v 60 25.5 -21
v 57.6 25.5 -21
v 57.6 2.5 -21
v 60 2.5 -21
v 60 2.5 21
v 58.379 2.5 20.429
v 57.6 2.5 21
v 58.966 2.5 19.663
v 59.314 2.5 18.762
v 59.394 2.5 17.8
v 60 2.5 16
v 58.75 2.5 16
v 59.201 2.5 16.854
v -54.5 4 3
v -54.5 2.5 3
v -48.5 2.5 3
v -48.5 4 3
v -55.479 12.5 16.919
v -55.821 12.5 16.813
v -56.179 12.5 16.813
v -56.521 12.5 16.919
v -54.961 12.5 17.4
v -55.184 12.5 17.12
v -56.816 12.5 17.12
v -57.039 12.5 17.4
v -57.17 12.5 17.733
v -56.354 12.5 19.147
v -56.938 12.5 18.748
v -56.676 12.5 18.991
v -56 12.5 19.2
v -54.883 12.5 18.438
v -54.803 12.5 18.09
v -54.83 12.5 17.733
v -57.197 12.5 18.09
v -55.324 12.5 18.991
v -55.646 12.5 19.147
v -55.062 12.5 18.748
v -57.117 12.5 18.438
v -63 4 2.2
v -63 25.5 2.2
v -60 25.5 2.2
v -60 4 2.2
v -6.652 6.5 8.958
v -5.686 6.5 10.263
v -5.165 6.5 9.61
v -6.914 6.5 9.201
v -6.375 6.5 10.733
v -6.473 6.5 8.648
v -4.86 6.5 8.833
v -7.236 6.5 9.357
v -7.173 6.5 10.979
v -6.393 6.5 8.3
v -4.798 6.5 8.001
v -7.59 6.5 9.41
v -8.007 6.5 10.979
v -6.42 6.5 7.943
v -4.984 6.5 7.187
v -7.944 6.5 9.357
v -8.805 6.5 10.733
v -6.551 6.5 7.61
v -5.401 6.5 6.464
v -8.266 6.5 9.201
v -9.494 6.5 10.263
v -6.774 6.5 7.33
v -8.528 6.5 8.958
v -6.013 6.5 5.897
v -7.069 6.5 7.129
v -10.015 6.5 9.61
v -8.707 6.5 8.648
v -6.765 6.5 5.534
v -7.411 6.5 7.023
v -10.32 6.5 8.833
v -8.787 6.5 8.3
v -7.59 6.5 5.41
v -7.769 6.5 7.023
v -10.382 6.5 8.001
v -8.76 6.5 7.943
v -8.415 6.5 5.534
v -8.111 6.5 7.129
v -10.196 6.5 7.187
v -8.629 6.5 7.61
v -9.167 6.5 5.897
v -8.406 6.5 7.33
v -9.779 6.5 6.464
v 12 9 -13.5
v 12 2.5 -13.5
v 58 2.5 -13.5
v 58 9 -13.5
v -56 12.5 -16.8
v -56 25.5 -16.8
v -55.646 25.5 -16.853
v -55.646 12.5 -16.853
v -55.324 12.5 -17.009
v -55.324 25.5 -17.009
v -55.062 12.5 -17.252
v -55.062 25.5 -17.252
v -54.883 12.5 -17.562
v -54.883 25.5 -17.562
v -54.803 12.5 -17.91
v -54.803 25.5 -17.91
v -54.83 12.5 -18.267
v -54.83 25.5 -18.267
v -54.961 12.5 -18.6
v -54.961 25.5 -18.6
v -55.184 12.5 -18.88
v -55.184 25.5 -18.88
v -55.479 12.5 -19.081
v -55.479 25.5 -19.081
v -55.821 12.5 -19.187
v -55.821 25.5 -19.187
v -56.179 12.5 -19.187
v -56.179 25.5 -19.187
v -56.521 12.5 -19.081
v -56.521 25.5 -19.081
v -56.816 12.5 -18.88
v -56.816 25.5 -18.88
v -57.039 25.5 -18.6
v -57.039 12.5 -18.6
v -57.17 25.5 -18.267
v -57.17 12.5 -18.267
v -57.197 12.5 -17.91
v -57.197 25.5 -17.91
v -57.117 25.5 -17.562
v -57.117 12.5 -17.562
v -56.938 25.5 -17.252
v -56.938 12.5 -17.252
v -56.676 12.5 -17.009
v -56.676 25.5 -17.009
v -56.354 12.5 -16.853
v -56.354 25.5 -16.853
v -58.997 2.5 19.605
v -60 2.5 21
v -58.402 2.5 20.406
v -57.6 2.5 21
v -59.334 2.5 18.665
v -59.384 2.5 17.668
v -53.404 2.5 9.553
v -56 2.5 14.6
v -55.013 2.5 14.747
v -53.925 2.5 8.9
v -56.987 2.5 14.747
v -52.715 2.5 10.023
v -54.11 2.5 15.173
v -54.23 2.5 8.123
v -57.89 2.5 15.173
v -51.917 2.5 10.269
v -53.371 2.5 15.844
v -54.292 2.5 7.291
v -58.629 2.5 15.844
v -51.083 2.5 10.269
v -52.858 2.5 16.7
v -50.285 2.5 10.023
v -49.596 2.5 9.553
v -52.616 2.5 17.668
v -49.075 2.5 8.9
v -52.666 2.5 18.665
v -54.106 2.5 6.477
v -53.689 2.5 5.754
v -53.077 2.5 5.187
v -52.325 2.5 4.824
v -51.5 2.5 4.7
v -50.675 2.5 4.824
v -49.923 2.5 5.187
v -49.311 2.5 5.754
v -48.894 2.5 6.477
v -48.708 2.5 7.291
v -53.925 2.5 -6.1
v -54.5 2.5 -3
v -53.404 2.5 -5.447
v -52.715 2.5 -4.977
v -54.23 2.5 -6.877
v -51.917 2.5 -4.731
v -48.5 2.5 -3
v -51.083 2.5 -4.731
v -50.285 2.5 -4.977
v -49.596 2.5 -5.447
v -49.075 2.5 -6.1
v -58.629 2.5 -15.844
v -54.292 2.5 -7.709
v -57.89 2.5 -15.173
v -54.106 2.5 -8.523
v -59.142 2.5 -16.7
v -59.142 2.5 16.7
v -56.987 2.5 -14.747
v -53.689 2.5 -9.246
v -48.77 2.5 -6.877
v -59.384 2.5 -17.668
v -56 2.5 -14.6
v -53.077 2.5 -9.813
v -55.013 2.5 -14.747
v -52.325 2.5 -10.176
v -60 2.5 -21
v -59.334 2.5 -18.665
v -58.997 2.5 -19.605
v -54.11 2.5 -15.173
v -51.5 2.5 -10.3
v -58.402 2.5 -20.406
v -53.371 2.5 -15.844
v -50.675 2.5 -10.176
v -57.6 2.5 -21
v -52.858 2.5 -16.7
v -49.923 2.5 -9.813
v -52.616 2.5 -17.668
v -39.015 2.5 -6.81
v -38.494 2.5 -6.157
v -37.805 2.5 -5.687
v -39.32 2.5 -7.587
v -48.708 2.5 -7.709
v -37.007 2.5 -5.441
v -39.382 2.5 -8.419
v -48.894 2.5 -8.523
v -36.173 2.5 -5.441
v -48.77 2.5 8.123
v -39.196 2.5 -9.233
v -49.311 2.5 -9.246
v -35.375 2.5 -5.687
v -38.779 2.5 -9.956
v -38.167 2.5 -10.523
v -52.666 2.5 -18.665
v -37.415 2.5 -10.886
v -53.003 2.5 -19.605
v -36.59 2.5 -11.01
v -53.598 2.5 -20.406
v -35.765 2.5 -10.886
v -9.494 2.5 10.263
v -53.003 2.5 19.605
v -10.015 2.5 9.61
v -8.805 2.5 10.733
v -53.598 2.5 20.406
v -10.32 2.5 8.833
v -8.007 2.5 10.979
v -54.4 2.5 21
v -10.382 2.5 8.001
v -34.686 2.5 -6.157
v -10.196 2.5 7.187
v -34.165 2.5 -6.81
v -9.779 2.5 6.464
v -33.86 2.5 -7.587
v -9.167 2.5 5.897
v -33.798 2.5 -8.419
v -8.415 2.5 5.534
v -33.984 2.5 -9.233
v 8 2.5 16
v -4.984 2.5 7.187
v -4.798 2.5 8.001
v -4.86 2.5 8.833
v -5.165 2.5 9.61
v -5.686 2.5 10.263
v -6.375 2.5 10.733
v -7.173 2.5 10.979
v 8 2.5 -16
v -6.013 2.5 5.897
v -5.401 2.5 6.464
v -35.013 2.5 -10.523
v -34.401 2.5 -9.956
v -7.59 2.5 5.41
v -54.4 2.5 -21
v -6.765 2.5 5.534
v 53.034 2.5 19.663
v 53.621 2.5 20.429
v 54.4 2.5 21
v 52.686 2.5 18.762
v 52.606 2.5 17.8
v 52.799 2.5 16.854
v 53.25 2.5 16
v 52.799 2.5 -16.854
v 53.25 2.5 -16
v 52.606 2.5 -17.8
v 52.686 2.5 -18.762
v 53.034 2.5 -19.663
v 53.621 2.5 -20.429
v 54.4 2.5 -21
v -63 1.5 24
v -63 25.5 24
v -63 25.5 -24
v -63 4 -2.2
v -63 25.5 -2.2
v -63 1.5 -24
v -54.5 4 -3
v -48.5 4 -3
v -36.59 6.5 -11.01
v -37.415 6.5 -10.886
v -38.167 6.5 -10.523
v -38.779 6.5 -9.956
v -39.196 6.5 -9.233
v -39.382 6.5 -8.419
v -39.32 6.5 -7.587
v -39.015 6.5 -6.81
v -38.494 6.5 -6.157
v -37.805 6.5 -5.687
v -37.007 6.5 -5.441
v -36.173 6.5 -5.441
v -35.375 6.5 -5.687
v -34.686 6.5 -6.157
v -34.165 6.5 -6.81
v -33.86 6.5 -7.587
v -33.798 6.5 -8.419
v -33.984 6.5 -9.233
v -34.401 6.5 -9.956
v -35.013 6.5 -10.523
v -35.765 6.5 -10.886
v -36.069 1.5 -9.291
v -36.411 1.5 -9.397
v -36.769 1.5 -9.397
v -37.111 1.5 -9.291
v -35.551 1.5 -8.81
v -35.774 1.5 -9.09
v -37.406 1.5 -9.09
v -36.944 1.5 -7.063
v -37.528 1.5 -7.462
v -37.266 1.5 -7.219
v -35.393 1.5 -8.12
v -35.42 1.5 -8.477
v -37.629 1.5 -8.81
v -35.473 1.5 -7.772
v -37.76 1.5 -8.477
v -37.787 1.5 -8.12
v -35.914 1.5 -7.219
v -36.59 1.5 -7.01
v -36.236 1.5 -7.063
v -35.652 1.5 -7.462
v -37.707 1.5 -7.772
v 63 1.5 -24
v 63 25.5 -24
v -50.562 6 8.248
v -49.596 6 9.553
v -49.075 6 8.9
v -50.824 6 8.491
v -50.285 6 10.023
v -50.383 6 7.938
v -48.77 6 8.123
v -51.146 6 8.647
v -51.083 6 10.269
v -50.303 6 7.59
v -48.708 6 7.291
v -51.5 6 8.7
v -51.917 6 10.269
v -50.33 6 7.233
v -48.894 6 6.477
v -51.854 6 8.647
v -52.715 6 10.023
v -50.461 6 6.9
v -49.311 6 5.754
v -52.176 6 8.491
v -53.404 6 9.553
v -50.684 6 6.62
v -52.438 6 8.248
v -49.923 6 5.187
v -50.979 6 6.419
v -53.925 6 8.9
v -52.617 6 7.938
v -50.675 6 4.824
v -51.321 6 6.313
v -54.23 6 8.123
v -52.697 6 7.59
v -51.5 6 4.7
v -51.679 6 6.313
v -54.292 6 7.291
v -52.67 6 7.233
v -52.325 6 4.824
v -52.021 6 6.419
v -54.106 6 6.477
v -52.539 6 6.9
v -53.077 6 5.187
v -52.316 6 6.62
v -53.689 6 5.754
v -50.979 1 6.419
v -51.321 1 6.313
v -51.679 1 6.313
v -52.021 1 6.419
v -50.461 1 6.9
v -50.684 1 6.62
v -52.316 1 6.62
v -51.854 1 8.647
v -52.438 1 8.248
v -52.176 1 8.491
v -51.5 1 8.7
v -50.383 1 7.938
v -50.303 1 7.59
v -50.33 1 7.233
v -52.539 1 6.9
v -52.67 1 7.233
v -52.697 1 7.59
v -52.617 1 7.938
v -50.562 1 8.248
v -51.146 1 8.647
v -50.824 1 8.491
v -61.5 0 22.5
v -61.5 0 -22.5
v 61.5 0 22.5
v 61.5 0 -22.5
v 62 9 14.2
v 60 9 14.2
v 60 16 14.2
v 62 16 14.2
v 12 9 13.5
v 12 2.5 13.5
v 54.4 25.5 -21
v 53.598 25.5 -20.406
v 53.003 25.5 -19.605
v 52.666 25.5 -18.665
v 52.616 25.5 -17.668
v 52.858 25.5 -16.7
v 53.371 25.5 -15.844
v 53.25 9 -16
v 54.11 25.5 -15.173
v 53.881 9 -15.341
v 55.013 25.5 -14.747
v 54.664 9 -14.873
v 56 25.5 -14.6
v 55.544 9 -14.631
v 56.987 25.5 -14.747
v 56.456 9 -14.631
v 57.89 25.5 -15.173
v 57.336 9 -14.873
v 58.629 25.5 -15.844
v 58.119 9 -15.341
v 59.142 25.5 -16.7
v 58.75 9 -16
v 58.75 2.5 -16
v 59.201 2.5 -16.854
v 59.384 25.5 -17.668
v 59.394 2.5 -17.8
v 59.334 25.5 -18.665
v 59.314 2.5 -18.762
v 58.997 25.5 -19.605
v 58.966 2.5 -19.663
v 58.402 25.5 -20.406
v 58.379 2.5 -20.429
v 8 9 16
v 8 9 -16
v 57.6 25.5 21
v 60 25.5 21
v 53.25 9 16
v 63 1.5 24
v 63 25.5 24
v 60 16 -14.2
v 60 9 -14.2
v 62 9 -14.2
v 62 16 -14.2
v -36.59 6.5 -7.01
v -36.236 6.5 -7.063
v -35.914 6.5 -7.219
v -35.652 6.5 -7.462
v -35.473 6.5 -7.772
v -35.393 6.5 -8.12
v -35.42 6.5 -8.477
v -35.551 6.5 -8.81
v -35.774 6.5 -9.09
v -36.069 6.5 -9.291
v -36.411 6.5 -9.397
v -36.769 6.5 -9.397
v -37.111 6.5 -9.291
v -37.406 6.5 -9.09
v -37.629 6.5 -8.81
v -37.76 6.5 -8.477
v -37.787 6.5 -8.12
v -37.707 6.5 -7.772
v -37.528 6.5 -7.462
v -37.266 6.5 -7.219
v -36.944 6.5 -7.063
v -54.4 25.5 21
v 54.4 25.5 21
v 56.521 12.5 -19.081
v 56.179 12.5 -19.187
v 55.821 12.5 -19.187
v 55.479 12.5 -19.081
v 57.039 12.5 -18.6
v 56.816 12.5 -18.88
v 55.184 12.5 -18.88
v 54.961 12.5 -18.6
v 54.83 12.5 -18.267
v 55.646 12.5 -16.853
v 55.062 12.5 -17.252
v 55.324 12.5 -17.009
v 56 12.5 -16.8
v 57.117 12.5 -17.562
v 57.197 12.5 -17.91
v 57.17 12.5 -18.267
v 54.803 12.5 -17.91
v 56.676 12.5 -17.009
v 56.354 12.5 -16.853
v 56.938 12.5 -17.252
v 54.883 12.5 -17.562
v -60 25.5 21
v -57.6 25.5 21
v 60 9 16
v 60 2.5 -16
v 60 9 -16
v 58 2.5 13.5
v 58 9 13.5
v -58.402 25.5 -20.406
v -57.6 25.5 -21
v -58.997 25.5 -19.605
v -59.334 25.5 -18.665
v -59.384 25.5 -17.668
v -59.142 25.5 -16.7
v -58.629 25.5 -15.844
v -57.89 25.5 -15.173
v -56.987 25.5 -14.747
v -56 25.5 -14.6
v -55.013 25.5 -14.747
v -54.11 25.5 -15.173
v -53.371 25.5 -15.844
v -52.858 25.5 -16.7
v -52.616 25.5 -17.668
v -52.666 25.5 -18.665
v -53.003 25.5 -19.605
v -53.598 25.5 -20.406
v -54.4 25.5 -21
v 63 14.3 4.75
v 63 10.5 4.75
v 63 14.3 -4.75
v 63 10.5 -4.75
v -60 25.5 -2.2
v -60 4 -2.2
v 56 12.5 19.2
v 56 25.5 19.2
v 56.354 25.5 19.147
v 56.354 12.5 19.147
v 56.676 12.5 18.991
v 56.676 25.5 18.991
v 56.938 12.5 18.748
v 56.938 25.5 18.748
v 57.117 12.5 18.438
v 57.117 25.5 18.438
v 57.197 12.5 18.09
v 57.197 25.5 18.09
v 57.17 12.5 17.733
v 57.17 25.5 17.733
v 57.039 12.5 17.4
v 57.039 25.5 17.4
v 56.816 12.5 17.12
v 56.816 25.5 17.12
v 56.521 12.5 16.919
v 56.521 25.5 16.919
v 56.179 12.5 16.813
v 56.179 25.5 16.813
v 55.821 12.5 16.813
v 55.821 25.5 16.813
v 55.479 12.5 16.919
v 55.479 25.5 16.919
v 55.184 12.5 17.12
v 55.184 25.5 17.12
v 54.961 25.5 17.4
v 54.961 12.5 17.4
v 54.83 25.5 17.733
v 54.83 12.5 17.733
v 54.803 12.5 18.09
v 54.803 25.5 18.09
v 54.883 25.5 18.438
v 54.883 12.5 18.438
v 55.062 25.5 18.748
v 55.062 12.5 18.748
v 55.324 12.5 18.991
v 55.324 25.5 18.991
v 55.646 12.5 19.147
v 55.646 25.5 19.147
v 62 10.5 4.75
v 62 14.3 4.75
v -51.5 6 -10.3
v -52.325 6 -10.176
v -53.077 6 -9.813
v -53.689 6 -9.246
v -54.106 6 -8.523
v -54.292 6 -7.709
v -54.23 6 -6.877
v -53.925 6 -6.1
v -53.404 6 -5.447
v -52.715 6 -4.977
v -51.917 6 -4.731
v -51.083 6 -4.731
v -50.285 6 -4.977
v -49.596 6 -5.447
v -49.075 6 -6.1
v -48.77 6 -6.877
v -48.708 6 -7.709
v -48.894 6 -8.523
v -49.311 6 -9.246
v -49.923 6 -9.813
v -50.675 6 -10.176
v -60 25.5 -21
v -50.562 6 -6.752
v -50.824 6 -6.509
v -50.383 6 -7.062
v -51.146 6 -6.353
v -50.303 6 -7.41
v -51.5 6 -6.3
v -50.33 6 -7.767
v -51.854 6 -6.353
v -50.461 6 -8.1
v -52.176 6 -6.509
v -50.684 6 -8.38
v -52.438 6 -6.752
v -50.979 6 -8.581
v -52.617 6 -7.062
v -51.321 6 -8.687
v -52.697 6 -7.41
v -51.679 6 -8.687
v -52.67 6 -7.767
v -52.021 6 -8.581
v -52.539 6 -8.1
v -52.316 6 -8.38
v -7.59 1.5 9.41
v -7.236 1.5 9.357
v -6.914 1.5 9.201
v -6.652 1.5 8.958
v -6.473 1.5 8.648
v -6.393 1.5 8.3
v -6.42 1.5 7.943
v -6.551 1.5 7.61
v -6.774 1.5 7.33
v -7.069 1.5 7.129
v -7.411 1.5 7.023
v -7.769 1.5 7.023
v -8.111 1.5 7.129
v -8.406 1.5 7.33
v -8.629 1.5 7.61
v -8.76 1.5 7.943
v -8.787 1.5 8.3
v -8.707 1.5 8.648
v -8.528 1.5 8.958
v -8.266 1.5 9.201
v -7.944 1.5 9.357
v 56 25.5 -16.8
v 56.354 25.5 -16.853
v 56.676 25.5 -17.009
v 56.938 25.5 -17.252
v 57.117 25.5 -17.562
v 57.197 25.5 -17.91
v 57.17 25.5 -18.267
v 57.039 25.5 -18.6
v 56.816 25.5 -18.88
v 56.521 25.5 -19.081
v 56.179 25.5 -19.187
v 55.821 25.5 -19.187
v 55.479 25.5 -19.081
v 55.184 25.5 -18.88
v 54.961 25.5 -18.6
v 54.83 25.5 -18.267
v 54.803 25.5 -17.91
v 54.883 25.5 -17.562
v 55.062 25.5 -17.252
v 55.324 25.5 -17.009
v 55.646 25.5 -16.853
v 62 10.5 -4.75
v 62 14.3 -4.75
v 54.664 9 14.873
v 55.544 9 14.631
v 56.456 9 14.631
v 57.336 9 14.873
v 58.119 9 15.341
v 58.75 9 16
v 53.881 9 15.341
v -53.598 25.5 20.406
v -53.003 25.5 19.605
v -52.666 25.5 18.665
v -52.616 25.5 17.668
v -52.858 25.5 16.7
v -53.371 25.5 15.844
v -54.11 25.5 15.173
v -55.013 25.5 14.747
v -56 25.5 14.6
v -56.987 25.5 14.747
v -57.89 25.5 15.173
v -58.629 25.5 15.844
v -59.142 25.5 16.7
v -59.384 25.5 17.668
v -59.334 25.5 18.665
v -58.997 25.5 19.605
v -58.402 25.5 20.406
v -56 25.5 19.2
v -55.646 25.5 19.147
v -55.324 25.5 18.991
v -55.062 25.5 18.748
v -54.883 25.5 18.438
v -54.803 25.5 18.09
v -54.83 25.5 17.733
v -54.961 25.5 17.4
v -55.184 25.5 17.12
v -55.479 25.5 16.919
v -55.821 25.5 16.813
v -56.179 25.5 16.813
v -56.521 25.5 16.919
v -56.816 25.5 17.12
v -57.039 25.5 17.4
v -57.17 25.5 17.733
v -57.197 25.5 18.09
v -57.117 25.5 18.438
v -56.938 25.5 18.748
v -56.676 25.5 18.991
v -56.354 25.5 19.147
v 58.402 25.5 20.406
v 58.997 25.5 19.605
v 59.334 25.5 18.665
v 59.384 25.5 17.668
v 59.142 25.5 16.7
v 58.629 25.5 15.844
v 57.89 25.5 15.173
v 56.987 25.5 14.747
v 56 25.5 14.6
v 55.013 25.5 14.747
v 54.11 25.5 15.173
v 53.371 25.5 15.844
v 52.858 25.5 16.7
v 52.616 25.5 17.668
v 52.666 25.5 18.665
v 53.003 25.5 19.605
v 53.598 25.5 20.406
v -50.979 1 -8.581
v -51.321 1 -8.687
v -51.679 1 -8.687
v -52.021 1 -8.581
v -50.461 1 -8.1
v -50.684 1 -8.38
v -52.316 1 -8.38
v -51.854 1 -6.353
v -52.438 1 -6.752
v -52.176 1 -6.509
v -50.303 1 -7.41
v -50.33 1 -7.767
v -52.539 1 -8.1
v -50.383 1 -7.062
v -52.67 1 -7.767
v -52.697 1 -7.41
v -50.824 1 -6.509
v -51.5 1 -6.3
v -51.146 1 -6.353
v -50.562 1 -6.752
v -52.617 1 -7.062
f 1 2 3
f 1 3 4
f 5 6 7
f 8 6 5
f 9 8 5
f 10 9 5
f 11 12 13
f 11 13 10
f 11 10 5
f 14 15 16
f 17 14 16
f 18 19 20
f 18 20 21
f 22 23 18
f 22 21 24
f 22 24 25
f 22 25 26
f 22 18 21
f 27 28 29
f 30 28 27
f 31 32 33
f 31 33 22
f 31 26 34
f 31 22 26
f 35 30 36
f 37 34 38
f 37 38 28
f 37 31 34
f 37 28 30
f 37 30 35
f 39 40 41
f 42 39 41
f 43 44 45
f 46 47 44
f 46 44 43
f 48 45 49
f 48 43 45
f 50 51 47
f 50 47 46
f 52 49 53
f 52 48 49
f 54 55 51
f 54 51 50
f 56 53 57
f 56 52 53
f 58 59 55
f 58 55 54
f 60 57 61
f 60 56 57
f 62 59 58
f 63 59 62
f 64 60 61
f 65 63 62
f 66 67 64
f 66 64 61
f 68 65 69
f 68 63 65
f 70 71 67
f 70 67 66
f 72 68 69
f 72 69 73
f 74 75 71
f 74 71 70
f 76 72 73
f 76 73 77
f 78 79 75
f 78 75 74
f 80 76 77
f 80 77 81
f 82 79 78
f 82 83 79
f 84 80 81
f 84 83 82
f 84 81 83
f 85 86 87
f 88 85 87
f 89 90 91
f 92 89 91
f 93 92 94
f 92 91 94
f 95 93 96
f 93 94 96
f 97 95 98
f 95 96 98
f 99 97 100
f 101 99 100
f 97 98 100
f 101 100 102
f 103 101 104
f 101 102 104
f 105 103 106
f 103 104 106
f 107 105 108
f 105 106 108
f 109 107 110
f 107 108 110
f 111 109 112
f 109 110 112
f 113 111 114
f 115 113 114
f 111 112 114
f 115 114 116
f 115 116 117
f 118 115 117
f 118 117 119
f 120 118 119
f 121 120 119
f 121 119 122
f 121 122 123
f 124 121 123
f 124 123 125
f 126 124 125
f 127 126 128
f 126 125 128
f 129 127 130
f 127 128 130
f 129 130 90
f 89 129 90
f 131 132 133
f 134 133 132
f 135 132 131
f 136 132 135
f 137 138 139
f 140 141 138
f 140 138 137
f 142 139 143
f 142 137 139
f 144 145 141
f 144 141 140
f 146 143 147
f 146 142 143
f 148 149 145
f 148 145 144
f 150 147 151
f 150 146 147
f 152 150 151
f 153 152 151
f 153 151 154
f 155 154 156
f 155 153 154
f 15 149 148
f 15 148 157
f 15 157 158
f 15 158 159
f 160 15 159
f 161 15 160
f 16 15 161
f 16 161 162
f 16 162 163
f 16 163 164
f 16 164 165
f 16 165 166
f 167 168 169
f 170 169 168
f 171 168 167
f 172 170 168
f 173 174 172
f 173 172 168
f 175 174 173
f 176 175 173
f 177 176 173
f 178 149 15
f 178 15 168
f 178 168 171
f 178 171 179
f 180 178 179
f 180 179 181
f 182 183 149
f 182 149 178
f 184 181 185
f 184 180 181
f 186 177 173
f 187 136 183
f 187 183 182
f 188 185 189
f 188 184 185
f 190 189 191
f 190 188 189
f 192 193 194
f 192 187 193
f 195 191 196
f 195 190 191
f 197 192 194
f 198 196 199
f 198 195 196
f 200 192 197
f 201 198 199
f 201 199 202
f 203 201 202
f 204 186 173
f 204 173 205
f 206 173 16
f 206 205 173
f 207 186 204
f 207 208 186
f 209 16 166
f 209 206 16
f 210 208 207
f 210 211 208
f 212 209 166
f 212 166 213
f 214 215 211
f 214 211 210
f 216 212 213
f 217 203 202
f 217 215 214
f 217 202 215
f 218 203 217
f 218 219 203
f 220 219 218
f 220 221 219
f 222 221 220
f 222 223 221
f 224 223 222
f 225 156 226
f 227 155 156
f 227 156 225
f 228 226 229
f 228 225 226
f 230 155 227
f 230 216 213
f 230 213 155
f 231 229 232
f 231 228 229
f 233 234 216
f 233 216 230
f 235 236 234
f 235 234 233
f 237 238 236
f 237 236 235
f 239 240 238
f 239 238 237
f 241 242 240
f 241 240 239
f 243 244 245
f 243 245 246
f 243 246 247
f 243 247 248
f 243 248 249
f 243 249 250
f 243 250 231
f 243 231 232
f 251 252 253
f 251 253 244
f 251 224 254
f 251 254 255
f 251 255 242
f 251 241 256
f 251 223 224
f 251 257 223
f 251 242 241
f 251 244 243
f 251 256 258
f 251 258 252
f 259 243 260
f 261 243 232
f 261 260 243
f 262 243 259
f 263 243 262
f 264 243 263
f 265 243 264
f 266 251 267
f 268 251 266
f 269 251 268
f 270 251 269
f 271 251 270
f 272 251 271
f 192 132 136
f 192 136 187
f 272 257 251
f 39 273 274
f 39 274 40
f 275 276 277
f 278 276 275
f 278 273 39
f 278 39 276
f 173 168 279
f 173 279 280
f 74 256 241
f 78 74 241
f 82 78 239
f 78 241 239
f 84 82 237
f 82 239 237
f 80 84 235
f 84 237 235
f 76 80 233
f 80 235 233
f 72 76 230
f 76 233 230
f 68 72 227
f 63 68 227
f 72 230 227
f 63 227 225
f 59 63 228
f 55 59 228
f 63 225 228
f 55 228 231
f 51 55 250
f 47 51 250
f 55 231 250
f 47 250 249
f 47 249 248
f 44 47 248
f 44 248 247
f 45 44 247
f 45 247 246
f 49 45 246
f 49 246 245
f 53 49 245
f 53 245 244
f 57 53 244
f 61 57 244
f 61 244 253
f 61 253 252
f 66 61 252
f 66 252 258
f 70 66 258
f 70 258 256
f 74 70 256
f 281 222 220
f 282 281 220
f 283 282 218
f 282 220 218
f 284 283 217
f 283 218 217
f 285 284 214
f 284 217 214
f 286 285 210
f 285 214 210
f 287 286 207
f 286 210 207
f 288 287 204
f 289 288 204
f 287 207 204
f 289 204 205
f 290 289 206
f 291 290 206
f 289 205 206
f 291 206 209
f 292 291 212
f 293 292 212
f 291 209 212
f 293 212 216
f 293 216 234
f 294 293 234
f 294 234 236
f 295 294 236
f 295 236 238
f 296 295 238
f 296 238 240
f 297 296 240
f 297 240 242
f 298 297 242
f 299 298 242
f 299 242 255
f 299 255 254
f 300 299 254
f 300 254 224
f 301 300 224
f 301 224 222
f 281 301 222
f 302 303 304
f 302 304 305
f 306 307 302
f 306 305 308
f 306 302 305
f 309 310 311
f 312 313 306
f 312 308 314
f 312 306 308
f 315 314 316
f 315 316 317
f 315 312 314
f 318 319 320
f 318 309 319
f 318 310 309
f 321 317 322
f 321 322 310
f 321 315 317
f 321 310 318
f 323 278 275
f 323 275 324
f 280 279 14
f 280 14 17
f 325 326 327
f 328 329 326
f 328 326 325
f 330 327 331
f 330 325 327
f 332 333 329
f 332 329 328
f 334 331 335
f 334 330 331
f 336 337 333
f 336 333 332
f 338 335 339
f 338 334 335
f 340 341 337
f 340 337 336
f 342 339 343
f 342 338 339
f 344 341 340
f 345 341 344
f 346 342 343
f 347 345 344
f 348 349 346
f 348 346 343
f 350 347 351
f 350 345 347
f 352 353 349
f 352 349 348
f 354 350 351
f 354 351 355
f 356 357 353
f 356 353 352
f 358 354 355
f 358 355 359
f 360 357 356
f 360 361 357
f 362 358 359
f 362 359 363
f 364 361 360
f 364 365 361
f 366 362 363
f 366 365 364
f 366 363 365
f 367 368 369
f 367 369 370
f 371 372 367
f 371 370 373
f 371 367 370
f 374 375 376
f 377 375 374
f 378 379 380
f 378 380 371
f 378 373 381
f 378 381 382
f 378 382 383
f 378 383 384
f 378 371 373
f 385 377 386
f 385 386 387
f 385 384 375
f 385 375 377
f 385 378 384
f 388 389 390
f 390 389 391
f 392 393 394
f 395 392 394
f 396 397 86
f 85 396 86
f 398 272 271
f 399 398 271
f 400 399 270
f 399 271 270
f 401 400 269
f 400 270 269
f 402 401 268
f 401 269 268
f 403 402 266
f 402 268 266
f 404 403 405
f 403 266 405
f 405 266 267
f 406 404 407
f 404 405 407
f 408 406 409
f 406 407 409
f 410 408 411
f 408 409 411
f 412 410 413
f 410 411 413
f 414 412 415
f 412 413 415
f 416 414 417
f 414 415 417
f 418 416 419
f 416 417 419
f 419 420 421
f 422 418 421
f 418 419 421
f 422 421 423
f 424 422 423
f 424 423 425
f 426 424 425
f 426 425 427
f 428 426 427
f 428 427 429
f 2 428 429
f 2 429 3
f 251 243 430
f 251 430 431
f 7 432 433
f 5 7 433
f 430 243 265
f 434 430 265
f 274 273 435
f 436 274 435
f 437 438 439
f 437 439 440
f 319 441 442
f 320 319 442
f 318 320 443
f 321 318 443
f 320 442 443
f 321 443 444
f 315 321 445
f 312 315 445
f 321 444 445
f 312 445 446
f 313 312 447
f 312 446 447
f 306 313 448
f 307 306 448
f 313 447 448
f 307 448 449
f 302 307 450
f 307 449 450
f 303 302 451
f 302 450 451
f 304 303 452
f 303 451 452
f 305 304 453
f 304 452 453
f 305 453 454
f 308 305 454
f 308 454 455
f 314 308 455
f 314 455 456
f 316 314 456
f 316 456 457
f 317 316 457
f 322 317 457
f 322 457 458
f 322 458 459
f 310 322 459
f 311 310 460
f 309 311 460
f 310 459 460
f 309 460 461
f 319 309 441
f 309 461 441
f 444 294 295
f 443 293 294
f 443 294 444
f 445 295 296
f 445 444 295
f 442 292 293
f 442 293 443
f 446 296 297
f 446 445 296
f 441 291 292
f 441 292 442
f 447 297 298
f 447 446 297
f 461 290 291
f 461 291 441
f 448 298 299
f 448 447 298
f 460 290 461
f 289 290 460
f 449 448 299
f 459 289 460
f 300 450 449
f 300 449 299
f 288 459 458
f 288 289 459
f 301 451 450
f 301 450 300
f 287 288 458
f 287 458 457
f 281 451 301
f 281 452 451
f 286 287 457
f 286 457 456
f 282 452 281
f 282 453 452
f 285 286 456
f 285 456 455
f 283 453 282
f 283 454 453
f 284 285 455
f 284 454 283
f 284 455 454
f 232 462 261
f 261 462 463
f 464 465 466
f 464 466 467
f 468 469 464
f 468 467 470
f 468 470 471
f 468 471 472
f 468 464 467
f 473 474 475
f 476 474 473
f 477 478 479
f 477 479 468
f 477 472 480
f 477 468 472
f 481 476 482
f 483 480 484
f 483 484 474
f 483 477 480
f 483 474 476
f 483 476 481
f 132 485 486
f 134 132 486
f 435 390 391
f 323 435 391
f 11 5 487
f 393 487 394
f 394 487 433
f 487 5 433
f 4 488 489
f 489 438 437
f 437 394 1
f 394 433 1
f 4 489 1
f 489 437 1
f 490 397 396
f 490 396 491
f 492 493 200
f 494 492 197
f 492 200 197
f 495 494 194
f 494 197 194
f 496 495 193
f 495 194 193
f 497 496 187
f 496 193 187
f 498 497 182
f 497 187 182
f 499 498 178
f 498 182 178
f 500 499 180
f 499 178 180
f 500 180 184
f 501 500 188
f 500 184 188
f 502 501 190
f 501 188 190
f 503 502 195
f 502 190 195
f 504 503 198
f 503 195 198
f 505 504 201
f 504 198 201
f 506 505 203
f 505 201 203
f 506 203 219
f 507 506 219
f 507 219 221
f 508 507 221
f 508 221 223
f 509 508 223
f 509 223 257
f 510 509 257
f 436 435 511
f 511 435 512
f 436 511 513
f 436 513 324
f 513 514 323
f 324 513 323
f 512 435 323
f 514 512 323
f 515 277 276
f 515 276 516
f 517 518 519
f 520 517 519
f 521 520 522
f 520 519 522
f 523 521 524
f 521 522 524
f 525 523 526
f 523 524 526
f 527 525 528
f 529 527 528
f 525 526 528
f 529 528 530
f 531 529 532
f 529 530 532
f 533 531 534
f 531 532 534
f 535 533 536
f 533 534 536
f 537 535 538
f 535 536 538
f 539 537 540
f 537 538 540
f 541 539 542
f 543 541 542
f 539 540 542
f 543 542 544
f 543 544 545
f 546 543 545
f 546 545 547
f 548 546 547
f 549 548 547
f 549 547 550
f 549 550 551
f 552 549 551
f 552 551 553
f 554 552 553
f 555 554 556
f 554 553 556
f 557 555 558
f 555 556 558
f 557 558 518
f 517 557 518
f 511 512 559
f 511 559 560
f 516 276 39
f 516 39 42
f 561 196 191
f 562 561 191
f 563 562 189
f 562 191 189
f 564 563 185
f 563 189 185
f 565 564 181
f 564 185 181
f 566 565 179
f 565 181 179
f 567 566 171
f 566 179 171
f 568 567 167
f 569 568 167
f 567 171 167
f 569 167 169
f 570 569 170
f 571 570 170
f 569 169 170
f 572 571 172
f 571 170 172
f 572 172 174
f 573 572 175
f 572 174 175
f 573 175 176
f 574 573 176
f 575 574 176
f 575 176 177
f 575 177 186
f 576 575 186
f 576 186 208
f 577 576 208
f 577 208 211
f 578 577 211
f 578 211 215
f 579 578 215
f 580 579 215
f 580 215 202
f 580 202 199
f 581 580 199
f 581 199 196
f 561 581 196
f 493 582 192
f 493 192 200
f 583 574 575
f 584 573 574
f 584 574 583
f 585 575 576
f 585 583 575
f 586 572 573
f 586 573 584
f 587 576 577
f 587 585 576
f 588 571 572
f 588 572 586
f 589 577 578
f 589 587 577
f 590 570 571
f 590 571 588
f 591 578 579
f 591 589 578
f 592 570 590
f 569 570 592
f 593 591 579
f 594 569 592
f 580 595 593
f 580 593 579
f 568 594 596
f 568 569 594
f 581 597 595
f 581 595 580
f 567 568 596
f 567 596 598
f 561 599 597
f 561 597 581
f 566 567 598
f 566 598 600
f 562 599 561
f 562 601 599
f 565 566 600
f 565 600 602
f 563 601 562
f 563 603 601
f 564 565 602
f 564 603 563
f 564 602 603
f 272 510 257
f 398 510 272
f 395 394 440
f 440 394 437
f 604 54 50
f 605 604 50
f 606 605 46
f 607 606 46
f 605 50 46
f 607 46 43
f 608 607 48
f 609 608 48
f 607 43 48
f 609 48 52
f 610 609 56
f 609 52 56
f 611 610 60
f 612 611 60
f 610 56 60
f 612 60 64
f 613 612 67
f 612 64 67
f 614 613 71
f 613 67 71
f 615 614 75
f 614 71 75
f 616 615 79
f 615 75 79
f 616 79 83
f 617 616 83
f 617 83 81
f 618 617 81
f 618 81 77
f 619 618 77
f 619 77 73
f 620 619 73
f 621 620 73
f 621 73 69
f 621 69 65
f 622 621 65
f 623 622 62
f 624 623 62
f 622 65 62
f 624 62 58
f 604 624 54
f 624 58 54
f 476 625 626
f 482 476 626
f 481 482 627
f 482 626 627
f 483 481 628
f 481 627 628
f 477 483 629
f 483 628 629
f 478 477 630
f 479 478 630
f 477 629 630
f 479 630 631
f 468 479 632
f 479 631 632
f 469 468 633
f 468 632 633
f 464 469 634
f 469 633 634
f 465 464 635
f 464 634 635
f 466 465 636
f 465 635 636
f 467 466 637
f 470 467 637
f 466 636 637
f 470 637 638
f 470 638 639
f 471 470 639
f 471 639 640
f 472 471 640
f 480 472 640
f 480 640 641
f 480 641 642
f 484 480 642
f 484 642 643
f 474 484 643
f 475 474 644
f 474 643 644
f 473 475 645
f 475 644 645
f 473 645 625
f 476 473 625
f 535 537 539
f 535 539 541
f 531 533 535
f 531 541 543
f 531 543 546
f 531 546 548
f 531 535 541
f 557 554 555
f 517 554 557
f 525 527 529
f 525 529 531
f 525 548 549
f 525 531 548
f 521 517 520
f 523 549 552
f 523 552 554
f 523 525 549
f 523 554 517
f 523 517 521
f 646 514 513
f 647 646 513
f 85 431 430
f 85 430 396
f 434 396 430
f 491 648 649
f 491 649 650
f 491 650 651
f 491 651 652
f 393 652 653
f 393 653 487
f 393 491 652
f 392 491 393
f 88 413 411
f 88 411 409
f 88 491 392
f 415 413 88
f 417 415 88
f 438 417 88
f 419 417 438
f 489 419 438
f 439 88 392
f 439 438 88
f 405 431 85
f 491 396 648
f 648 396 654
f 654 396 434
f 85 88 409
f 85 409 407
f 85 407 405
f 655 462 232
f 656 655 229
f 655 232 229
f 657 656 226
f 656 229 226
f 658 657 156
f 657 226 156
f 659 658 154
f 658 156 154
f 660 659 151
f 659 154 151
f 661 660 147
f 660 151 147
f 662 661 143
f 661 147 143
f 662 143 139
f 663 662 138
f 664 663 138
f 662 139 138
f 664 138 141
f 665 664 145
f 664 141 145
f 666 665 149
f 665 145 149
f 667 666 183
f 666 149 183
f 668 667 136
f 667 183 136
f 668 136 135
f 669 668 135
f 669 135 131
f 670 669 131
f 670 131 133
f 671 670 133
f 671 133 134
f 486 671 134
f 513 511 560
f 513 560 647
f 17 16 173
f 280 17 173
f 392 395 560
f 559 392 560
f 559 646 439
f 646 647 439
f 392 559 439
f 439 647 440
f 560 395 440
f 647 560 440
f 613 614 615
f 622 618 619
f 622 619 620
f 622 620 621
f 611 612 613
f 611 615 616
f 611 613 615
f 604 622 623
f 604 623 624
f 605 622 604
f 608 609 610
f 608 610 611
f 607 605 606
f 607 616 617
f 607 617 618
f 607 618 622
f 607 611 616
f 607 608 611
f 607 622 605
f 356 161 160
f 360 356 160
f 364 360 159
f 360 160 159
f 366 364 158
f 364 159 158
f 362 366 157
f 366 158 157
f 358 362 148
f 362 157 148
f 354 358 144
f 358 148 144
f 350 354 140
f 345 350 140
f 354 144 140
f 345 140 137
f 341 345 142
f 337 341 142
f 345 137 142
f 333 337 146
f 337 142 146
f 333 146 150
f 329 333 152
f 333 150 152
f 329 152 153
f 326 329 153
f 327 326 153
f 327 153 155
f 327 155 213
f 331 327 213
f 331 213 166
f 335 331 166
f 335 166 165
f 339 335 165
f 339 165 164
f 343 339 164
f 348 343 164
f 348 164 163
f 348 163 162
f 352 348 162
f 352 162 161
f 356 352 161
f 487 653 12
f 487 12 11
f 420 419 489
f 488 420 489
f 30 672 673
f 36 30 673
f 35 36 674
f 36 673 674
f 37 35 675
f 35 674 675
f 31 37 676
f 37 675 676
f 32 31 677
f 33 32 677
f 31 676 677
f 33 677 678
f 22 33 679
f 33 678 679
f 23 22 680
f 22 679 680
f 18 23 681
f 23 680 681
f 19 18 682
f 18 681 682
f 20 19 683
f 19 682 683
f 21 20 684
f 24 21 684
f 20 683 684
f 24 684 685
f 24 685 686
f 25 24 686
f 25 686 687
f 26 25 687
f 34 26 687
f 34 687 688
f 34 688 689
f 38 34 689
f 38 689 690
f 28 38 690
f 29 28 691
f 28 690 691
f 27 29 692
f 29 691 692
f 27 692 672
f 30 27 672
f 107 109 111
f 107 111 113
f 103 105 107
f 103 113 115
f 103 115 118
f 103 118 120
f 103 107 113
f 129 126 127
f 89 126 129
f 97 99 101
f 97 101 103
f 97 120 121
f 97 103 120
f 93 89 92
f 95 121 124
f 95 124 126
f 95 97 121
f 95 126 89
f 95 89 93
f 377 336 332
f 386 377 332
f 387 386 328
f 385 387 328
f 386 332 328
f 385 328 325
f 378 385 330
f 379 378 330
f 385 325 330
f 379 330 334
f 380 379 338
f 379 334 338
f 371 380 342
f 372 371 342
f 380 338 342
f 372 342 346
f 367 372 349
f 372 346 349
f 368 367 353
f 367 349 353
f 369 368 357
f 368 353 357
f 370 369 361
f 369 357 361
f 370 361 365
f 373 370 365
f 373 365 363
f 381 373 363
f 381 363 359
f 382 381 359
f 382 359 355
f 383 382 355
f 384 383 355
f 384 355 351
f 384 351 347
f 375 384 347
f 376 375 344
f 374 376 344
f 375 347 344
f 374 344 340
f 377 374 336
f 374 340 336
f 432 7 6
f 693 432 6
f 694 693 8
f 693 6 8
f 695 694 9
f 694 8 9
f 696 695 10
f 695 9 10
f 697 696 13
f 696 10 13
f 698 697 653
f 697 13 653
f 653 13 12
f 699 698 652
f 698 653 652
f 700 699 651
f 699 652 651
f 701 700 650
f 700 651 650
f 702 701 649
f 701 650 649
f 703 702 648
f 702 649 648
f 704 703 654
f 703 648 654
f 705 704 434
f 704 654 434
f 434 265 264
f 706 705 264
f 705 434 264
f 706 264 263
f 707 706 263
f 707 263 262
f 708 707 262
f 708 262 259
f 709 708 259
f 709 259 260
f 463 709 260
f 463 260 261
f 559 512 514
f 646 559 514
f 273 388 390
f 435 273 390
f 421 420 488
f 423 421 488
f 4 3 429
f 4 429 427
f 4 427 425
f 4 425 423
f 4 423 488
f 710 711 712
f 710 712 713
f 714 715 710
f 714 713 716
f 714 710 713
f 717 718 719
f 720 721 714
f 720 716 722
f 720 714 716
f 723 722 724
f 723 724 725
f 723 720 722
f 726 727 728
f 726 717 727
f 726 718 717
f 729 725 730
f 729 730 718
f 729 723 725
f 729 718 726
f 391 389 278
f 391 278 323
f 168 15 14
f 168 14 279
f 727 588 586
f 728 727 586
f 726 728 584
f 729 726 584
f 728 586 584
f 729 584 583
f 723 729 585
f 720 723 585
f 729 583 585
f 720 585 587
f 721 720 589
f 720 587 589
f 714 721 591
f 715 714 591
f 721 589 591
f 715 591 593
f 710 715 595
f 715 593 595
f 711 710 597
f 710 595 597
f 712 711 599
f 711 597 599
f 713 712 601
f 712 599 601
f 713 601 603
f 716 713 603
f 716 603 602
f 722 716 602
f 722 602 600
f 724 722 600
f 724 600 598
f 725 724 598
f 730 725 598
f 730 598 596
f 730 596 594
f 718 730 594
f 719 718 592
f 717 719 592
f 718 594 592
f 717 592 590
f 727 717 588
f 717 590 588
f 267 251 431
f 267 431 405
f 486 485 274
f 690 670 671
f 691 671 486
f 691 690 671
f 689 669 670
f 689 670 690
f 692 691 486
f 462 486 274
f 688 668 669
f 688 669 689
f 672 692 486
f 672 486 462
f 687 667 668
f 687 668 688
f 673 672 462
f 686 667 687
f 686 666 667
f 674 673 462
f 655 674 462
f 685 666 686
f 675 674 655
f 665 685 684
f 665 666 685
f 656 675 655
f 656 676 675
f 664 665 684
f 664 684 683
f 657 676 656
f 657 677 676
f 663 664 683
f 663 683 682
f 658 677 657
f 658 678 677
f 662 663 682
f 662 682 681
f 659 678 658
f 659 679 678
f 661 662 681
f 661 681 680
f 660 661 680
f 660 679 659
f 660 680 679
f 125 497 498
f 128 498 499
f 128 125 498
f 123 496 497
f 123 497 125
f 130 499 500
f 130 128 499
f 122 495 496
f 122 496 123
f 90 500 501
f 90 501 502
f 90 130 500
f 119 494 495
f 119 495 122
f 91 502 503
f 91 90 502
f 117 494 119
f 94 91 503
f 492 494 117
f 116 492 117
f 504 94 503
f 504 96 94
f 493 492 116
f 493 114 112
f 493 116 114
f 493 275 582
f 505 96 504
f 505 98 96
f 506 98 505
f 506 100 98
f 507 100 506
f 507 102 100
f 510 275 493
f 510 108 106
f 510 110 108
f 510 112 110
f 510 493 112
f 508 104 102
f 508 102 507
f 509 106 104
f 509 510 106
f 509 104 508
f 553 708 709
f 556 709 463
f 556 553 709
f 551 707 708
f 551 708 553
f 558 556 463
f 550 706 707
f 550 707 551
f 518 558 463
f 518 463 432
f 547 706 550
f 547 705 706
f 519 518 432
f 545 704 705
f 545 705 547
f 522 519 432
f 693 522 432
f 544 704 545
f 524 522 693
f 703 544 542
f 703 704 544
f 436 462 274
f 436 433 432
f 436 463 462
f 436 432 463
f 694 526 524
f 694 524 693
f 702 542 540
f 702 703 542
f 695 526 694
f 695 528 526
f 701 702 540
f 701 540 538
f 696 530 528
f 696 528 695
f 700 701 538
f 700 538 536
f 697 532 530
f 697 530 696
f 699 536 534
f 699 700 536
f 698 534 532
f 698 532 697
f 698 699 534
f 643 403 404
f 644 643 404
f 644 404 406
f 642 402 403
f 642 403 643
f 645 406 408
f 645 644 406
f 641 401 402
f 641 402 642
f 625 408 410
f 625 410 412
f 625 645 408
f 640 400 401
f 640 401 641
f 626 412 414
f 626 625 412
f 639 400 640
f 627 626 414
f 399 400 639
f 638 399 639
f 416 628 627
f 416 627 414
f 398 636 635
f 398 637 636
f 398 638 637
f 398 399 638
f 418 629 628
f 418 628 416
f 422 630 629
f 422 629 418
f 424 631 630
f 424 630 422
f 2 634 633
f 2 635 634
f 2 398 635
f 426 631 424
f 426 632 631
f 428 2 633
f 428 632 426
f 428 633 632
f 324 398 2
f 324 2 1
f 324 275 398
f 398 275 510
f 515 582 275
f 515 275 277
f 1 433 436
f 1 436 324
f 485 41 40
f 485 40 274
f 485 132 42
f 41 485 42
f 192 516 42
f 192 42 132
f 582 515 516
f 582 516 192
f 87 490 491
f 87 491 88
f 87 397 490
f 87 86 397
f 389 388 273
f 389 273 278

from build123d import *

# Parameters (mm, degrees)
SKETCH1_W           = 126
SKETCH1_H           = 48
BOSS_EXTRUDE1_DEPTH = 25.5
CHAMFER1_SIZE       = 1.5
SKETCH2_W           = 120
SKETCH2_H           = 42
CUT_EXTRUDE1_DEPTH  = 23
SKETCH3_R           = 3.4
BOSS_EXTRUDE2_DEPTH = 25.5
SKETCH4_R           = 1.2
CUT_EXTRUDE2_DEPTH  = 13
SKETCH5_R           = 2.8
BOSS_EXTRUDE3_DEPTH = 6.5
SKETCH6_R           = 1.2
CUT_EXTRUDE3_DEPTH  = 5
SKETCH7_R           = 2.8
BOSS_EXTRUDE4_DEPTH = 6
SKETCH8_W           = 6
SKETCH8_H           = 6
BOSS_EXTRUDE5_DEPTH = 4
SKETCH9_R           = 1.2
CUT_EXTRUDE4_DEPTH  = 5
SKETCH10_W          = 5
SKETCH10_H          = 4.4
CUT_EXTRUDE5_DEPTH  = 21.5
SKETCH11_W          = 52
SKETCH11_H          = 32
SKETCH11_W_2        = 46
SKETCH11_H_2        = 27
BOSS_EXTRUDE6_DEPTH = 9
SKETCH12_W          = 28.4
SKETCH12_H          = 7
CUT_EXTRUDE7_DEPTH  = 2
SKETCH13_W          = 9.5
SKETCH13_H          = 3.8
CUT_EXTRUDE8_DEPTH  = 2


with BuildPart() as part:
    # Sketch1 → Boss-Extrude1 (new body)
    with BuildSketch(Plane(origin=(0, 0, 0), x_dir=(1, 0, 0), z_dir=(0, 1, 0))):
        Rectangle(SKETCH1_W, SKETCH1_H)
    extrude(amount=BOSS_EXTRUDE1_DEPTH)

    # Chamfer1
    chamfer1_edges = [part.edges().sort_by_distance(p)[0] for p in [
        (0, 0, -24),
        (63, 0, 0),
        (0, 0, 24),
        (-63, 0, 0),
    ]]
    chamfer(chamfer1_edges, length=CHAMFER1_SIZE)

    # Sketch2 → Cut-Extrude1 (cut)
    with BuildSketch(Plane(origin=(0, 25.5, 0), x_dir=(1, 0, 0), z_dir=(0, 1, 0))):
        Rectangle(SKETCH2_W, SKETCH2_H)
    extrude(amount=-CUT_EXTRUDE1_DEPTH, mode=Mode.SUBTRACT)

    # Sketch3 → Boss-Extrude2 (add)
    with BuildSketch(Plane(origin=(0, 0, 0), x_dir=(1, 0, 0), z_dir=(0, 1, 0))):
        with Locations((-56, 18)):
            Circle(SKETCH3_R)
        with Locations((-56, -18)):
            Circle(SKETCH3_R)
        with Locations((56, 18)):
            Circle(SKETCH3_R)
        with Locations((56, -18)):
            Circle(SKETCH3_R)
    extrude(amount=BOSS_EXTRUDE2_DEPTH)

    # Sketch4 → Cut-Extrude2 (cut)
    with BuildSketch(Plane(origin=(0, 25.5, 0), x_dir=(1, 0, 0), z_dir=(0, 1, 0))):
        with Locations(Location((-56, 18, 0), (0, 0, 270))):
            Circle(SKETCH4_R)
        with Locations(Location((-56, -18, 0), (0, 0, 270))):
            Circle(SKETCH4_R)
        with Locations(Location((56, 18, 0), (0, 0, 270))):
            Circle(SKETCH4_R)
        with Locations(Location((56, -18, 0), (0, 0, 270))):
            Circle(SKETCH4_R)
    extrude(amount=-CUT_EXTRUDE2_DEPTH, mode=Mode.SUBTRACT)

    # Sketch5 → Boss-Extrude3 (add)
    with BuildSketch(Plane(origin=(0, 0, 0), x_dir=(1, 0, 0), z_dir=(0, 1, 0))):
        with Locations(Location((-36.59, 8.21, 0), (0, 0, 90))):
            Circle(SKETCH5_R)
        with Locations(Location((-7.59, -8.21, 0), (0, 0, 90))):
            Circle(SKETCH5_R)
    extrude(amount=BOSS_EXTRUDE3_DEPTH)

    # Sketch6 → Cut-Extrude3 (cut)
    with BuildSketch(Plane(origin=(0, 6.5, 0), x_dir=(1, 0, 0), z_dir=(0, 1, 0))):
        with Locations(Location((-36.59, 8.21, 0), (0, 0, 270))):
            Circle(SKETCH6_R)
        with Locations(Location((-7.59, -8.21, 0), (0, 0, 270))):
            Circle(SKETCH6_R)
    extrude(amount=-CUT_EXTRUDE3_DEPTH, mode=Mode.SUBTRACT)

    # Sketch7 → Boss-Extrude4 (add)
    with BuildSketch(Plane(origin=(0, 0, 0), x_dir=(1, 0, 0), z_dir=(0, 1, 0))):
        with Locations(Location((-51.5, 7.5, 0), (0, 0, 90))):
            Circle(SKETCH7_R)
        with Locations(Location((-51.5, -7.5, 0), (0, 0, 90))):
            Circle(SKETCH7_R)
    extrude(amount=BOSS_EXTRUDE4_DEPTH)

    # Sketch8 → Boss-Extrude5 (add)
    with BuildSketch(Plane(origin=(0, 0, 0), x_dir=(1, 0, 0), z_dir=(0, 1, 0))):
        with Locations((-51.5, 0)):
            Rectangle(SKETCH8_W, SKETCH8_H)
    extrude(amount=BOSS_EXTRUDE5_DEPTH)

    # Sketch9 → Cut-Extrude4 (cut)
    with BuildSketch(Plane(origin=(0, 6, 0), x_dir=(1, 0, 0), z_dir=(0, 1, 0))):
        with Locations(Location((-51.5, 7.5, 0), (0, 0, 270))):
            Circle(SKETCH9_R)
        with Locations(Location((-51.5, -7.5, 0), (0, 0, 270))):
            Circle(SKETCH9_R)
    extrude(amount=-CUT_EXTRUDE4_DEPTH, mode=Mode.SUBTRACT)

    # Sketch10 → Cut-Extrude5 (cut)
    with BuildSketch(Plane(origin=(0, 25.5, 0), x_dir=(1, 0, 0), z_dir=(0, 1, 0))):
        with Locations((-61.5, 0)):
            Rectangle(SKETCH10_W, SKETCH10_H)
    extrude(amount=-CUT_EXTRUDE5_DEPTH, mode=Mode.SUBTRACT)

    # Sketch11 → Boss-Extrude6 (add)
    with BuildSketch(Plane(origin=(0, 0, 0), x_dir=(1, 0, 0), z_dir=(0, 1, 0))):
        with Locations((34, 0)):
            Rectangle(SKETCH11_W, SKETCH11_H)
        with Locations((35, 0)):
            Rectangle(SKETCH11_W_2, SKETCH11_H_2, mode=Mode.SUBTRACT)
    extrude(amount=BOSS_EXTRUDE6_DEPTH)

    # Sketch12 → Cut-Extrude7 (cut)
    with BuildSketch(Plane(origin=(60, 0, 0), x_dir=(0, 0, -1), z_dir=(1, 0, 0))):
        with Locations((0, 12.5)):
            Rectangle(SKETCH12_W, SKETCH12_H)
    extrude(amount=CUT_EXTRUDE7_DEPTH, mode=Mode.SUBTRACT)

    # Sketch13 → Cut-Extrude8 (cut)
    with BuildSketch(Plane(origin=(63, 0, 0), x_dir=(0, 0, -1), z_dir=(1, 0, 0))):
        with Locations((0, 12.4)):
            Rectangle(SKETCH13_W, SKETCH13_H)
    extrude(amount=-CUT_EXTRUDE8_DEPTH, mode=Mode.SUBTRACT)


solid = part.part
